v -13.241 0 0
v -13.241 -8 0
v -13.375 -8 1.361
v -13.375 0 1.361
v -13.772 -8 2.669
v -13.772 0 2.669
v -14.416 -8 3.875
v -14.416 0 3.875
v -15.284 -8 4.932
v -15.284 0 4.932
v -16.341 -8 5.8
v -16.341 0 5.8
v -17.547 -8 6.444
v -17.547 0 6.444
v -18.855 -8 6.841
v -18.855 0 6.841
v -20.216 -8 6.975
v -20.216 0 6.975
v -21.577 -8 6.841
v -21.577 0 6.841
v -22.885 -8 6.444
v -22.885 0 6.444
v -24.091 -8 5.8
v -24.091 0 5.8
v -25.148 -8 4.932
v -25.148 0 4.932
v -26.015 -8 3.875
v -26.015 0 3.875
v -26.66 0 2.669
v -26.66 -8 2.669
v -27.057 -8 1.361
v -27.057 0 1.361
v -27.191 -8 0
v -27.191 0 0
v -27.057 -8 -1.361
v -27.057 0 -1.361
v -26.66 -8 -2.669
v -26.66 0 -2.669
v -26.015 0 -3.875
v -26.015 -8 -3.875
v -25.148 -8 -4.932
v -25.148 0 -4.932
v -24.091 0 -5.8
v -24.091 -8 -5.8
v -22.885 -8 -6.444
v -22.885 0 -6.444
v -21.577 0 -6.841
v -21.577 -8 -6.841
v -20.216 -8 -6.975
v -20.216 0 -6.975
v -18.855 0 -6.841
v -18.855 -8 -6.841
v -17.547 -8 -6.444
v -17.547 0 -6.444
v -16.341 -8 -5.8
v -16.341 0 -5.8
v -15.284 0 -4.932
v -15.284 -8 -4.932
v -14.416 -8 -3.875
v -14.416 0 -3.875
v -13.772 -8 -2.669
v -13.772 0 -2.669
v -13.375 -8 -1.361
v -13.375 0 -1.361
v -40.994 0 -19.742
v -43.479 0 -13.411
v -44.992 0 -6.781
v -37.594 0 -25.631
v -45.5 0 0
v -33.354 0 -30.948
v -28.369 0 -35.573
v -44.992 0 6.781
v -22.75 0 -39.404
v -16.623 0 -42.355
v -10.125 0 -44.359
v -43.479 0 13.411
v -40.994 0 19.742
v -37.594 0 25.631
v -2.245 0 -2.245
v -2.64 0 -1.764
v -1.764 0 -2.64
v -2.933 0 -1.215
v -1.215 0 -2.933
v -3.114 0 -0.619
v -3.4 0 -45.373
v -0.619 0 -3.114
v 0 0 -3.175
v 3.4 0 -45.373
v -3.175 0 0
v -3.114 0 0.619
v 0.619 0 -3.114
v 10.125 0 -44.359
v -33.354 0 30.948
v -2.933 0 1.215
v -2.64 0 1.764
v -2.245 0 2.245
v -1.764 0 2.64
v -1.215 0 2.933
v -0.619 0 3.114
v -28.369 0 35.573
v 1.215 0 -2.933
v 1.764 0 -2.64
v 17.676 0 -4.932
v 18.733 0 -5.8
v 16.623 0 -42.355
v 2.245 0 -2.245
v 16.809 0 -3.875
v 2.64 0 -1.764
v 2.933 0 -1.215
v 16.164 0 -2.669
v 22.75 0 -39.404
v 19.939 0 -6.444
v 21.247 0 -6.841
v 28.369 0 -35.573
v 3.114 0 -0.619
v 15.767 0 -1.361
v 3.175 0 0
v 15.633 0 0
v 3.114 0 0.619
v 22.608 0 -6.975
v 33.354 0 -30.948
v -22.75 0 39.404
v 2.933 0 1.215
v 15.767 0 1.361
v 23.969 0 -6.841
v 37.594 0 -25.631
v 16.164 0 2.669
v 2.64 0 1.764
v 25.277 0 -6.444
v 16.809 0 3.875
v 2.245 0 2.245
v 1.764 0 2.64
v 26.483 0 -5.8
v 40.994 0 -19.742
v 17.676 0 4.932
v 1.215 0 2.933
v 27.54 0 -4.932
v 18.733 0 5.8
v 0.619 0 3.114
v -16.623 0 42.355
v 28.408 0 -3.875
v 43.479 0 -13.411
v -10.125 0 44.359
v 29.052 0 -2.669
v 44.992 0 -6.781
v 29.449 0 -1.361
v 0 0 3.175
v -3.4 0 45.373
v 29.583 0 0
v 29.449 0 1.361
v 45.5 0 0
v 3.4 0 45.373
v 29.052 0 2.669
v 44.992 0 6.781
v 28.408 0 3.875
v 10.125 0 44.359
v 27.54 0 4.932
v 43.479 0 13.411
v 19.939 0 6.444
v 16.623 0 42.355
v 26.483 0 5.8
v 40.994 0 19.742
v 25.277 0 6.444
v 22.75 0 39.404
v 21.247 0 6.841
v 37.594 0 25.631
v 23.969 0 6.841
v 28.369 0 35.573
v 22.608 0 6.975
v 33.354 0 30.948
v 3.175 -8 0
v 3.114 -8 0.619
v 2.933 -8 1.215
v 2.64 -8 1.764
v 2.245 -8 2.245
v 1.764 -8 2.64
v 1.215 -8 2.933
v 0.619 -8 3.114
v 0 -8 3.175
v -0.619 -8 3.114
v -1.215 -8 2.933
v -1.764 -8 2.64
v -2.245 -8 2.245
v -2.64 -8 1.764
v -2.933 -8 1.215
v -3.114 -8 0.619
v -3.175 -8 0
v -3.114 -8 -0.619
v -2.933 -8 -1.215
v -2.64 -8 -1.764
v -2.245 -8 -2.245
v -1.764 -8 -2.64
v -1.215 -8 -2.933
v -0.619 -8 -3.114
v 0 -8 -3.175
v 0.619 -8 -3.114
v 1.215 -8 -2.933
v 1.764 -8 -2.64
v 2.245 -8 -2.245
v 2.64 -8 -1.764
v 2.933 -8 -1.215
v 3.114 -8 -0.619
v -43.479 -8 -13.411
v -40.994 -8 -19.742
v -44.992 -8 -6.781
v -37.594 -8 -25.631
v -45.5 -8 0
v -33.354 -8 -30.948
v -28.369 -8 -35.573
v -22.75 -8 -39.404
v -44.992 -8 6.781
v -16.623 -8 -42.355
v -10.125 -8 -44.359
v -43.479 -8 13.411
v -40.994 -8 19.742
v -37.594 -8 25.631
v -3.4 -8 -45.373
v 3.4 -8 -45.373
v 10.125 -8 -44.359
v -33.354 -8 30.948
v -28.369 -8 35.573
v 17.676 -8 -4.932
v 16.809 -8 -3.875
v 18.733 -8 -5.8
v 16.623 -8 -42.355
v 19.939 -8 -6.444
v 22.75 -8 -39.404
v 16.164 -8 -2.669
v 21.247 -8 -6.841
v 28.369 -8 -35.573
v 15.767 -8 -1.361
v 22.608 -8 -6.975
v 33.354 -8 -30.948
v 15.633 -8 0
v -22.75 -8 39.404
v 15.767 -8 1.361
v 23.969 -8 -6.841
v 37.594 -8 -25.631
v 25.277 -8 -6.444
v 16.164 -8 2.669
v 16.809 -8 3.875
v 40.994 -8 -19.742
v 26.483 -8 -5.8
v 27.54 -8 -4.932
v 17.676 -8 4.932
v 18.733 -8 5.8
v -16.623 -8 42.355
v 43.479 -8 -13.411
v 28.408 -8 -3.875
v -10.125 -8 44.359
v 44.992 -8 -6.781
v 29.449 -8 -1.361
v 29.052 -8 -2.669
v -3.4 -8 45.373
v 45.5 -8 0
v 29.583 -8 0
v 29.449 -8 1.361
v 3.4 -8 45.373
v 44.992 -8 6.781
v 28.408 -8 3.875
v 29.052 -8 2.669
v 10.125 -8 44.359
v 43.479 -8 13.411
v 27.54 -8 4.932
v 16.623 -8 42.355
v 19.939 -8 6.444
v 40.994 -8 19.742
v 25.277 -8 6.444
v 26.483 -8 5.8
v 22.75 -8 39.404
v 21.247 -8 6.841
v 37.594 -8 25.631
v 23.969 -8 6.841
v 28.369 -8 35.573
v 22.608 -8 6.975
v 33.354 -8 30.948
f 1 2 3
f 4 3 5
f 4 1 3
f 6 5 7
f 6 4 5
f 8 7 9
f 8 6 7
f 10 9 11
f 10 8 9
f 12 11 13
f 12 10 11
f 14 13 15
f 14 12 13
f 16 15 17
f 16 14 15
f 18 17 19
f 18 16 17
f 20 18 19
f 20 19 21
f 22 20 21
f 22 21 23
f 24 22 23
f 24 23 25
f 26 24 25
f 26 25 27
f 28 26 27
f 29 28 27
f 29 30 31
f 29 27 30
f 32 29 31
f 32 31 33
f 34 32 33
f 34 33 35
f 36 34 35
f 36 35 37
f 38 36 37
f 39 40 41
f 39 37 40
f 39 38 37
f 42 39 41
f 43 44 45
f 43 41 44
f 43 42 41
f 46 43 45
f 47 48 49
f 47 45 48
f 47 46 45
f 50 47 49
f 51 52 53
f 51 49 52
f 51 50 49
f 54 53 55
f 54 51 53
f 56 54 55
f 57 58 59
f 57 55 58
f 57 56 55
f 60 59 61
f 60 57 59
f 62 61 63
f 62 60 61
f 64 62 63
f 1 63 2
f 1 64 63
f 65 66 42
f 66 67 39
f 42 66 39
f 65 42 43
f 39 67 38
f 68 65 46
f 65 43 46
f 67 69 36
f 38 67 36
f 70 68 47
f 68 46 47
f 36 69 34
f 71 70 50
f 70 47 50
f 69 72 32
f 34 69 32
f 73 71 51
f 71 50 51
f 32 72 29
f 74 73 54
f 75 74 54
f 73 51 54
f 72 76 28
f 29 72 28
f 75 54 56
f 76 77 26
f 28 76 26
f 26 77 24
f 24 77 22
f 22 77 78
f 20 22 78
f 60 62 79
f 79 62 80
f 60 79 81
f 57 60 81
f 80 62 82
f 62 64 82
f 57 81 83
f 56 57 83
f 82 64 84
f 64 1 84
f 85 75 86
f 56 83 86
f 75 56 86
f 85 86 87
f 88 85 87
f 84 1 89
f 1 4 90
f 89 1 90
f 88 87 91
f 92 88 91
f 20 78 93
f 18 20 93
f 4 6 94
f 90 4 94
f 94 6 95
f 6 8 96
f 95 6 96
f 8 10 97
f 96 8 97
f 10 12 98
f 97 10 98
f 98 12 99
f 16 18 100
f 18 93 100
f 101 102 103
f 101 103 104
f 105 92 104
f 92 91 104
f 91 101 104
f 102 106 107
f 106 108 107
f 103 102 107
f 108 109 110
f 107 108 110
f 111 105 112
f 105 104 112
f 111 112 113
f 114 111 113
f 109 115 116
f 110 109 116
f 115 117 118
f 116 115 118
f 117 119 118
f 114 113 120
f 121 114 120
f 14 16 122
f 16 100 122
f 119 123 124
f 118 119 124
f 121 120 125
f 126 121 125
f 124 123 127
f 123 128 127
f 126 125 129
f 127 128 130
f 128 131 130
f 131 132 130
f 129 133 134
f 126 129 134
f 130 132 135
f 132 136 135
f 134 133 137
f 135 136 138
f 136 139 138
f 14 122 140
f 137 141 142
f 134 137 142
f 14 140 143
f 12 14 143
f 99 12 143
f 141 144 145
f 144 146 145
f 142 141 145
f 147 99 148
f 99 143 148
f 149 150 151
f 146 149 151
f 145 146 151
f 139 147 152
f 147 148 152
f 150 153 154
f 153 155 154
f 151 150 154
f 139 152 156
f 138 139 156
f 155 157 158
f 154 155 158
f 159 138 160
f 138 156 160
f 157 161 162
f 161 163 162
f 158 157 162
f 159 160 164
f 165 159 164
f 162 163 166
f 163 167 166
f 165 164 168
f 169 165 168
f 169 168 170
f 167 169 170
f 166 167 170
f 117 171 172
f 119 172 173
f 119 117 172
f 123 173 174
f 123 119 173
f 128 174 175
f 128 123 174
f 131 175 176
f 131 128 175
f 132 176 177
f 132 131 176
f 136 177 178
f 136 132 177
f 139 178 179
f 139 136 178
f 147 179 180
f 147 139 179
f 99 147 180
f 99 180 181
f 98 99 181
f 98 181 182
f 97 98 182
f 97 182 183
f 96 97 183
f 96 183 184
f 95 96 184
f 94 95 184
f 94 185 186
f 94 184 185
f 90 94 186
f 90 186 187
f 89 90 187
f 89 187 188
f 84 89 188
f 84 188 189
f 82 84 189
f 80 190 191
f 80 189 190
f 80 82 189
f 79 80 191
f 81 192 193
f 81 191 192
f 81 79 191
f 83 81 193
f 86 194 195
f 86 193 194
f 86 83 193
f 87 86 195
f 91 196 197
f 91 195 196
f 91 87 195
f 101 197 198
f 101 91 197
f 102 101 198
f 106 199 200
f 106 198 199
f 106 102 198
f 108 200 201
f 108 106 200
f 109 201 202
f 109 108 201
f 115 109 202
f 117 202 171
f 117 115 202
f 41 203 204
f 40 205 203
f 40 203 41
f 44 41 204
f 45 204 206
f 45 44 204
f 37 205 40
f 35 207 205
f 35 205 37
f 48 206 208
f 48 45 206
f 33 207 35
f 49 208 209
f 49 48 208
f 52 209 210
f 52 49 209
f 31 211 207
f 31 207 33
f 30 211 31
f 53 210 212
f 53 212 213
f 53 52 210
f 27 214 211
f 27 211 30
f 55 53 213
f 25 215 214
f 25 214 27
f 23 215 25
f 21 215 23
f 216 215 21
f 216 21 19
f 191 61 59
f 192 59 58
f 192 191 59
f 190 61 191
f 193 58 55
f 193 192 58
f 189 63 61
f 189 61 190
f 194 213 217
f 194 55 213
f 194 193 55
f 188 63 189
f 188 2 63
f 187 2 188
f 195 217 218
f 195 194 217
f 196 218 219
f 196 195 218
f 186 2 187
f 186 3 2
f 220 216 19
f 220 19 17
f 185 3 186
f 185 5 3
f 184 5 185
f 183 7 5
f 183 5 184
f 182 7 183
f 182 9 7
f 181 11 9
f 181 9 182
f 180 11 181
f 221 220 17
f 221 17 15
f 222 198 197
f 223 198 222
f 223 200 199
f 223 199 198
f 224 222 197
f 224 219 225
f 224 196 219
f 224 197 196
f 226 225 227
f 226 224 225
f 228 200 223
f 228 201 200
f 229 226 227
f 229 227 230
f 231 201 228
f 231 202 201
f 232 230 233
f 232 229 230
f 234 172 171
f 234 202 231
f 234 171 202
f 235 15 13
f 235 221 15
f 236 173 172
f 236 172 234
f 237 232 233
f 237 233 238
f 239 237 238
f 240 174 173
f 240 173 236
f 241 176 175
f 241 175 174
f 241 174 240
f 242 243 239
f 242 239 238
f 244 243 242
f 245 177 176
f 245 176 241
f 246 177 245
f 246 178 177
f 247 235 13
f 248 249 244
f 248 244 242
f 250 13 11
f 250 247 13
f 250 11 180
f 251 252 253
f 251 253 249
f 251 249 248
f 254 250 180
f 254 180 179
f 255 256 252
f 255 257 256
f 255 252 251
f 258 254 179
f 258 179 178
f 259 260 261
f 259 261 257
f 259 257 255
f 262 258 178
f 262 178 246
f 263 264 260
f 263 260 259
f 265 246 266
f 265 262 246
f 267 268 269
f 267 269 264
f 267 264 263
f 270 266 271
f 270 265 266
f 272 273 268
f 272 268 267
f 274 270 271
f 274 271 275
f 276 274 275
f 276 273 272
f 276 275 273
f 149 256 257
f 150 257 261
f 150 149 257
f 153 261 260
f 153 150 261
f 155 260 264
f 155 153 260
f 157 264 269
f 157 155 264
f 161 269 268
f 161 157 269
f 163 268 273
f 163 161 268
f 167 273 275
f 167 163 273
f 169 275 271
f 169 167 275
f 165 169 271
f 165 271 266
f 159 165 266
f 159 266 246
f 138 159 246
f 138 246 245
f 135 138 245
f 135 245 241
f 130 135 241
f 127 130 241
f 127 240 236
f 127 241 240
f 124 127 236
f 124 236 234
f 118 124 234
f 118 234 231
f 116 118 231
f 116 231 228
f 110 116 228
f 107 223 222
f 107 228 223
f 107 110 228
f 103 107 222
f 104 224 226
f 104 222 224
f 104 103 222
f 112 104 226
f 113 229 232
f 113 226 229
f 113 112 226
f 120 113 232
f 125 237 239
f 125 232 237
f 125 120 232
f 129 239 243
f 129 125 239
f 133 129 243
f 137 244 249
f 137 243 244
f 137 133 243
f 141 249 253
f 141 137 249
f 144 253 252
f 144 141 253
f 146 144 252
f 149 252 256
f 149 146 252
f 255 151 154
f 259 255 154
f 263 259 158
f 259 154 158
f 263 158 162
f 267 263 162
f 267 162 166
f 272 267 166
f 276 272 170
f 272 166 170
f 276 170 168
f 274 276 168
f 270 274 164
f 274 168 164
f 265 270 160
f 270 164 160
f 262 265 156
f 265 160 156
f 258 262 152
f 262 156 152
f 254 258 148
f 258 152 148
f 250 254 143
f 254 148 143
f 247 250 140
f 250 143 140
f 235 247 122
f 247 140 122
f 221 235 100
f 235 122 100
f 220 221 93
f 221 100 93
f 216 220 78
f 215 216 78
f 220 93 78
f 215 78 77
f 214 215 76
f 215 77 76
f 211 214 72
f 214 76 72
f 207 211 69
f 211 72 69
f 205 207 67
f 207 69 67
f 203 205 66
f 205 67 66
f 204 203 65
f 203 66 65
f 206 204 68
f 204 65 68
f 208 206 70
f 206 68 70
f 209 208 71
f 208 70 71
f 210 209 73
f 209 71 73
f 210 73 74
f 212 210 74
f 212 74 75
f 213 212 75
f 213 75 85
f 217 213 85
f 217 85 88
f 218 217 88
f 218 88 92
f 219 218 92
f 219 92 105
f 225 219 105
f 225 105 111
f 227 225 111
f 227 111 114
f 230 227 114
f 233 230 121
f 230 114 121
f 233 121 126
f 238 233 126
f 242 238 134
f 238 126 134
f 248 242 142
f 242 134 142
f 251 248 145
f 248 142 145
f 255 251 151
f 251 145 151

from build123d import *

# Parameters (mm, degrees)
F0_R     = 45.5
F2_DEPTH = 8
F1_R     = 3.175
F3_DEPTH = 8.001
F4_R     = 6.975
F5_DEPTH = 25


with BuildPart() as f2:
    # F0 (on Front) → F2 (new body)
    with BuildSketch(Plane.XZ):
        Circle(F0_R)
    extrude(amount=F2_DEPTH)

    # F1 (on Front) → F3 (cut, through all)
    with BuildSketch(Plane.XZ):
        Circle(F1_R)
    extrude(amount=F3_DEPTH, mode=Mode.SUBTRACT)

    # F4 (on Front) → F5 (cut)
    with BuildSketch(Plane.XZ):
        with Locations((-20.215824, 0)):
            Circle(F4_R)
        with Locations((22.608229, 0)):
            Circle(F4_R)
    extrude(amount=F5_DEPTH, mode=Mode.SUBTRACT)


solid = f2.part
